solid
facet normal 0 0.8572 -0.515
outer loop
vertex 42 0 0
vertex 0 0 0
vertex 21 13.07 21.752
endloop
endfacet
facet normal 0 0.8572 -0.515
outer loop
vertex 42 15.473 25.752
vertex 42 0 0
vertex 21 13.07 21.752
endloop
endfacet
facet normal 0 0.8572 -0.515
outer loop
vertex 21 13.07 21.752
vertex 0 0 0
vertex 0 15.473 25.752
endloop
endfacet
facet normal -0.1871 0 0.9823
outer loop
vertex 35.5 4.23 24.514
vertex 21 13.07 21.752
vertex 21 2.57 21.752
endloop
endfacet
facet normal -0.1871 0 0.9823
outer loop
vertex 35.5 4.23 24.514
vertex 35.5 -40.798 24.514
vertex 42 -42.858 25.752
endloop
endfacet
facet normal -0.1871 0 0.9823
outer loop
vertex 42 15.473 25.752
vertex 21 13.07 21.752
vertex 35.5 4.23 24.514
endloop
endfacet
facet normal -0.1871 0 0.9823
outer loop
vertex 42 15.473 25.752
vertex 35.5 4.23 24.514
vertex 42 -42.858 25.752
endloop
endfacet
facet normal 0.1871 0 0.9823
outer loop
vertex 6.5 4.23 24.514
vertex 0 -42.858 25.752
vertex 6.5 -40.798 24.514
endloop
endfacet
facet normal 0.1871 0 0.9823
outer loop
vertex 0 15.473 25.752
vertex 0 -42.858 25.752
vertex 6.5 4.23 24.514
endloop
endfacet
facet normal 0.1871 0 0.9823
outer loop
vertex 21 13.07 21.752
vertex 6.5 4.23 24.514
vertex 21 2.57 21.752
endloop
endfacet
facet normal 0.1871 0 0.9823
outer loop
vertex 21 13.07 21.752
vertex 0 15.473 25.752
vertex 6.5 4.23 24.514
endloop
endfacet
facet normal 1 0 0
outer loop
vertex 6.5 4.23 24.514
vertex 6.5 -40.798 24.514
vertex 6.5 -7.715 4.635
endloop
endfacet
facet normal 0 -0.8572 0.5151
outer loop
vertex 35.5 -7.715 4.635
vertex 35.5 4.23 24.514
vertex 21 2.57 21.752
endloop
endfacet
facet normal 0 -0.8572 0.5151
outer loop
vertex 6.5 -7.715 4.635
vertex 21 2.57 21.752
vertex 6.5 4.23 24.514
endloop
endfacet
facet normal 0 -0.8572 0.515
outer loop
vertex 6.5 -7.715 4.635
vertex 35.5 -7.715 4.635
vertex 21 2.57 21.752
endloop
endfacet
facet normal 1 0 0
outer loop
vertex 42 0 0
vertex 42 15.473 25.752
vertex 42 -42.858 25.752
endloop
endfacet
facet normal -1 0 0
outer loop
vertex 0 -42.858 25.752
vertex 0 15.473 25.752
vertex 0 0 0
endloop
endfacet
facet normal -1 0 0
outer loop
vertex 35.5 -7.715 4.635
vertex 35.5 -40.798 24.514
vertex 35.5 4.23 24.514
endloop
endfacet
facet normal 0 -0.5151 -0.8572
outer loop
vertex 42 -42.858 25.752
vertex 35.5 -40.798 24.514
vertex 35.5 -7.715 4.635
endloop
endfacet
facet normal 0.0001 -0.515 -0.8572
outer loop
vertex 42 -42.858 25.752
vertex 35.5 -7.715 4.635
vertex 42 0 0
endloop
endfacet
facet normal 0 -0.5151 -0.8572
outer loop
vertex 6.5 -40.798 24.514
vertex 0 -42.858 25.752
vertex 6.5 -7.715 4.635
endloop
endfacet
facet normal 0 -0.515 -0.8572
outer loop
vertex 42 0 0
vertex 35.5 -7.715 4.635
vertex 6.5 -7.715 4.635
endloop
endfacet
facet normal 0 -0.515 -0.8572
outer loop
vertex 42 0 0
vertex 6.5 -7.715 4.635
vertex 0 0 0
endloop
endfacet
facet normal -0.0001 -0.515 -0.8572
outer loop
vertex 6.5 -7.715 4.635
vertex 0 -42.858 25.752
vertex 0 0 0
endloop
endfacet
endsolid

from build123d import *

# Parameters (mm, degrees)
EXTRUDE_1_DEPTH     = 42
CUT_EXTRUDE_3_DEPTH = 77.352761936
SKETCH_4_W          = 29
SKETCH_4_H          = 38.596109301
CUT_EXTRUDE_4_DEPTH = 42


with BuildPart() as part:
    # Эскиз1 → Бобышка-Вытянуть1 (new body)
    with BuildSketch(Plane(origin=(0, 0, 0), x_dir=(0, 0, -1), z_dir=(1, 0, 0))):
        Polygon((0, 0), (-25.751903746, 15.473304826), (-25.751903746, -42.858365035), align=None)
    extrude(amount=EXTRUDE_1_DEPTH)

    # Эскиз3 → Вырез-Вытянуть3 (cut, through all)
    with BuildSketch(Plane(origin=(0, 15.473304826, 0), x_dir=(1, 0, 0), z_dir=(0, 1, 0))):
        Polygon((0, -25.751903746), (21, -21.751903746), (42, -25.751903746), align=None)
    extrude(amount=-CUT_EXTRUDE_3_DEPTH, mode=Mode.SUBTRACT)

    # Эскиз4 → Вырез-Вытянуть4 (cut)
    with BuildSketch(Plane(origin=(0, 0, 0), x_dir=(-1, 0, 0), z_dir=(0, -0.5150380749100486, -0.8571673007021157))):
        with Locations((-21, -28.298054651)):
            Rectangle(SKETCH_4_W, SKETCH_4_H)
    extrude(amount=-CUT_EXTRUDE_4_DEPTH, mode=Mode.SUBTRACT)


solid = part.part
